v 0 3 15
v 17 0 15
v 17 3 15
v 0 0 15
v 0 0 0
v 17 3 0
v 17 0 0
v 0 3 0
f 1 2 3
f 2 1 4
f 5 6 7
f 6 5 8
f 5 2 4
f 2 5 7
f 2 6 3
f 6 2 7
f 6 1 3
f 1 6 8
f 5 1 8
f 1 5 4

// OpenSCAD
// Generated by SolidPython 1.0.1 on 2020-07-29 00:46:56


cube(size = [17, 3, 15]);
/***********************************************
*********      SolidPython code:      **********
************************************************
 
# import packages: SolidPython
from solid import *
from solid.utils import *
from itertools import chain, combinations, permutations


class Resize:

    def __init__(self, scad_file):
        self.scad_file = scad_file
        #self.scad_file = import_scad(scad_file)
        # cone/cylinder param:
        self.r1 = 0
        self.r2 = 0
        self.h = 0
        # rectangular prism param:
        self.w = 0
        self.l = 0
        # ellipse param:
        self.r = 0

    # import OpenScad code (file name corresponds to shape)


    # classify shape + parameters
    def assign(self, param1, param2, param3):
        if self.scad_file == 'cone.scad':
            self.r1 = param1
            self.r2 = param2
            self.h = param3
        elif self.scad_file == 'cylinder.scad':
            self.r1 = param1
            self.r2 = param2
            self.h = param3
        elif self.scad_file == 'rectangularPrism.scad':
            self.h = param1
            self.l = param2
            self.w = param3
        else:
            self.r = param1
            self.h = param2

    # resize parameters
    def iterate(self):
        x = range(3, 20, 2)
        i = 1
        if self.scad_file == 'cone.scad':
            tempList = list(permutations(x, 2))
            for temp in tempList:
                param1 = temp[0]
                param2 = temp[1]
                filepath = 'produced_scad_files/' + 'cone' + str(param1) + '_' + str(param2) + '_' + '.scad'
                scad_render_to_file(cylinder(h=param1, r1=param2, r2=0), filepath)

        elif self.scad_file == 'cylinder.scad':
            tempList = list(permutations(x, 3))
            for temp in tempList:
                param1 = temp[0]
                param2 = temp[1]
                filepath = 'produced_scad_files/' + 'cylinder' + str(param1) + '_' + str(param2) + '_' + '.scad'
                scad_render_to_file(cylinder(h=param1, r1=param2, r2=param2), filepath)

        elif self.scad_file == 'rectangularPrism.scad':
            tempList = list(permutations(x, 3))
            for temp in tempList:
                param1 = temp[0]
                param2 = temp[1]
                param3 = temp[2]
                filepath = 'produced_scad_files/' + 'rectangularPrism' + str(param1) + '_' + str(param2) + '_' + str(
                    param3) + '.scad'
                scad_render_to_file(cube(size=(param1, param2, param3)), filepath)

        elif self.scad_file == 'ellipse.scad':
            tempList = list(permutations(x, 4))
            for temp in tempList:
                param1 = temp[0]
                param2 = temp[1]
                param3 = temp[2]
                param4 = temp[3]
                filepath = 'produced_scad_files/' + 'ellipse' + str(param1) + '_' + str(param2) + '_' + str(param3) + '_' + str(param4) + '.scad'
                scad_render_to_file(scale([param1, param2, param3])(sphere(r=param4)), filepath)

    def render_to_scadfile(self):
        scad_render_to_file(scad, 'example.scad') 
 
************************************************/
